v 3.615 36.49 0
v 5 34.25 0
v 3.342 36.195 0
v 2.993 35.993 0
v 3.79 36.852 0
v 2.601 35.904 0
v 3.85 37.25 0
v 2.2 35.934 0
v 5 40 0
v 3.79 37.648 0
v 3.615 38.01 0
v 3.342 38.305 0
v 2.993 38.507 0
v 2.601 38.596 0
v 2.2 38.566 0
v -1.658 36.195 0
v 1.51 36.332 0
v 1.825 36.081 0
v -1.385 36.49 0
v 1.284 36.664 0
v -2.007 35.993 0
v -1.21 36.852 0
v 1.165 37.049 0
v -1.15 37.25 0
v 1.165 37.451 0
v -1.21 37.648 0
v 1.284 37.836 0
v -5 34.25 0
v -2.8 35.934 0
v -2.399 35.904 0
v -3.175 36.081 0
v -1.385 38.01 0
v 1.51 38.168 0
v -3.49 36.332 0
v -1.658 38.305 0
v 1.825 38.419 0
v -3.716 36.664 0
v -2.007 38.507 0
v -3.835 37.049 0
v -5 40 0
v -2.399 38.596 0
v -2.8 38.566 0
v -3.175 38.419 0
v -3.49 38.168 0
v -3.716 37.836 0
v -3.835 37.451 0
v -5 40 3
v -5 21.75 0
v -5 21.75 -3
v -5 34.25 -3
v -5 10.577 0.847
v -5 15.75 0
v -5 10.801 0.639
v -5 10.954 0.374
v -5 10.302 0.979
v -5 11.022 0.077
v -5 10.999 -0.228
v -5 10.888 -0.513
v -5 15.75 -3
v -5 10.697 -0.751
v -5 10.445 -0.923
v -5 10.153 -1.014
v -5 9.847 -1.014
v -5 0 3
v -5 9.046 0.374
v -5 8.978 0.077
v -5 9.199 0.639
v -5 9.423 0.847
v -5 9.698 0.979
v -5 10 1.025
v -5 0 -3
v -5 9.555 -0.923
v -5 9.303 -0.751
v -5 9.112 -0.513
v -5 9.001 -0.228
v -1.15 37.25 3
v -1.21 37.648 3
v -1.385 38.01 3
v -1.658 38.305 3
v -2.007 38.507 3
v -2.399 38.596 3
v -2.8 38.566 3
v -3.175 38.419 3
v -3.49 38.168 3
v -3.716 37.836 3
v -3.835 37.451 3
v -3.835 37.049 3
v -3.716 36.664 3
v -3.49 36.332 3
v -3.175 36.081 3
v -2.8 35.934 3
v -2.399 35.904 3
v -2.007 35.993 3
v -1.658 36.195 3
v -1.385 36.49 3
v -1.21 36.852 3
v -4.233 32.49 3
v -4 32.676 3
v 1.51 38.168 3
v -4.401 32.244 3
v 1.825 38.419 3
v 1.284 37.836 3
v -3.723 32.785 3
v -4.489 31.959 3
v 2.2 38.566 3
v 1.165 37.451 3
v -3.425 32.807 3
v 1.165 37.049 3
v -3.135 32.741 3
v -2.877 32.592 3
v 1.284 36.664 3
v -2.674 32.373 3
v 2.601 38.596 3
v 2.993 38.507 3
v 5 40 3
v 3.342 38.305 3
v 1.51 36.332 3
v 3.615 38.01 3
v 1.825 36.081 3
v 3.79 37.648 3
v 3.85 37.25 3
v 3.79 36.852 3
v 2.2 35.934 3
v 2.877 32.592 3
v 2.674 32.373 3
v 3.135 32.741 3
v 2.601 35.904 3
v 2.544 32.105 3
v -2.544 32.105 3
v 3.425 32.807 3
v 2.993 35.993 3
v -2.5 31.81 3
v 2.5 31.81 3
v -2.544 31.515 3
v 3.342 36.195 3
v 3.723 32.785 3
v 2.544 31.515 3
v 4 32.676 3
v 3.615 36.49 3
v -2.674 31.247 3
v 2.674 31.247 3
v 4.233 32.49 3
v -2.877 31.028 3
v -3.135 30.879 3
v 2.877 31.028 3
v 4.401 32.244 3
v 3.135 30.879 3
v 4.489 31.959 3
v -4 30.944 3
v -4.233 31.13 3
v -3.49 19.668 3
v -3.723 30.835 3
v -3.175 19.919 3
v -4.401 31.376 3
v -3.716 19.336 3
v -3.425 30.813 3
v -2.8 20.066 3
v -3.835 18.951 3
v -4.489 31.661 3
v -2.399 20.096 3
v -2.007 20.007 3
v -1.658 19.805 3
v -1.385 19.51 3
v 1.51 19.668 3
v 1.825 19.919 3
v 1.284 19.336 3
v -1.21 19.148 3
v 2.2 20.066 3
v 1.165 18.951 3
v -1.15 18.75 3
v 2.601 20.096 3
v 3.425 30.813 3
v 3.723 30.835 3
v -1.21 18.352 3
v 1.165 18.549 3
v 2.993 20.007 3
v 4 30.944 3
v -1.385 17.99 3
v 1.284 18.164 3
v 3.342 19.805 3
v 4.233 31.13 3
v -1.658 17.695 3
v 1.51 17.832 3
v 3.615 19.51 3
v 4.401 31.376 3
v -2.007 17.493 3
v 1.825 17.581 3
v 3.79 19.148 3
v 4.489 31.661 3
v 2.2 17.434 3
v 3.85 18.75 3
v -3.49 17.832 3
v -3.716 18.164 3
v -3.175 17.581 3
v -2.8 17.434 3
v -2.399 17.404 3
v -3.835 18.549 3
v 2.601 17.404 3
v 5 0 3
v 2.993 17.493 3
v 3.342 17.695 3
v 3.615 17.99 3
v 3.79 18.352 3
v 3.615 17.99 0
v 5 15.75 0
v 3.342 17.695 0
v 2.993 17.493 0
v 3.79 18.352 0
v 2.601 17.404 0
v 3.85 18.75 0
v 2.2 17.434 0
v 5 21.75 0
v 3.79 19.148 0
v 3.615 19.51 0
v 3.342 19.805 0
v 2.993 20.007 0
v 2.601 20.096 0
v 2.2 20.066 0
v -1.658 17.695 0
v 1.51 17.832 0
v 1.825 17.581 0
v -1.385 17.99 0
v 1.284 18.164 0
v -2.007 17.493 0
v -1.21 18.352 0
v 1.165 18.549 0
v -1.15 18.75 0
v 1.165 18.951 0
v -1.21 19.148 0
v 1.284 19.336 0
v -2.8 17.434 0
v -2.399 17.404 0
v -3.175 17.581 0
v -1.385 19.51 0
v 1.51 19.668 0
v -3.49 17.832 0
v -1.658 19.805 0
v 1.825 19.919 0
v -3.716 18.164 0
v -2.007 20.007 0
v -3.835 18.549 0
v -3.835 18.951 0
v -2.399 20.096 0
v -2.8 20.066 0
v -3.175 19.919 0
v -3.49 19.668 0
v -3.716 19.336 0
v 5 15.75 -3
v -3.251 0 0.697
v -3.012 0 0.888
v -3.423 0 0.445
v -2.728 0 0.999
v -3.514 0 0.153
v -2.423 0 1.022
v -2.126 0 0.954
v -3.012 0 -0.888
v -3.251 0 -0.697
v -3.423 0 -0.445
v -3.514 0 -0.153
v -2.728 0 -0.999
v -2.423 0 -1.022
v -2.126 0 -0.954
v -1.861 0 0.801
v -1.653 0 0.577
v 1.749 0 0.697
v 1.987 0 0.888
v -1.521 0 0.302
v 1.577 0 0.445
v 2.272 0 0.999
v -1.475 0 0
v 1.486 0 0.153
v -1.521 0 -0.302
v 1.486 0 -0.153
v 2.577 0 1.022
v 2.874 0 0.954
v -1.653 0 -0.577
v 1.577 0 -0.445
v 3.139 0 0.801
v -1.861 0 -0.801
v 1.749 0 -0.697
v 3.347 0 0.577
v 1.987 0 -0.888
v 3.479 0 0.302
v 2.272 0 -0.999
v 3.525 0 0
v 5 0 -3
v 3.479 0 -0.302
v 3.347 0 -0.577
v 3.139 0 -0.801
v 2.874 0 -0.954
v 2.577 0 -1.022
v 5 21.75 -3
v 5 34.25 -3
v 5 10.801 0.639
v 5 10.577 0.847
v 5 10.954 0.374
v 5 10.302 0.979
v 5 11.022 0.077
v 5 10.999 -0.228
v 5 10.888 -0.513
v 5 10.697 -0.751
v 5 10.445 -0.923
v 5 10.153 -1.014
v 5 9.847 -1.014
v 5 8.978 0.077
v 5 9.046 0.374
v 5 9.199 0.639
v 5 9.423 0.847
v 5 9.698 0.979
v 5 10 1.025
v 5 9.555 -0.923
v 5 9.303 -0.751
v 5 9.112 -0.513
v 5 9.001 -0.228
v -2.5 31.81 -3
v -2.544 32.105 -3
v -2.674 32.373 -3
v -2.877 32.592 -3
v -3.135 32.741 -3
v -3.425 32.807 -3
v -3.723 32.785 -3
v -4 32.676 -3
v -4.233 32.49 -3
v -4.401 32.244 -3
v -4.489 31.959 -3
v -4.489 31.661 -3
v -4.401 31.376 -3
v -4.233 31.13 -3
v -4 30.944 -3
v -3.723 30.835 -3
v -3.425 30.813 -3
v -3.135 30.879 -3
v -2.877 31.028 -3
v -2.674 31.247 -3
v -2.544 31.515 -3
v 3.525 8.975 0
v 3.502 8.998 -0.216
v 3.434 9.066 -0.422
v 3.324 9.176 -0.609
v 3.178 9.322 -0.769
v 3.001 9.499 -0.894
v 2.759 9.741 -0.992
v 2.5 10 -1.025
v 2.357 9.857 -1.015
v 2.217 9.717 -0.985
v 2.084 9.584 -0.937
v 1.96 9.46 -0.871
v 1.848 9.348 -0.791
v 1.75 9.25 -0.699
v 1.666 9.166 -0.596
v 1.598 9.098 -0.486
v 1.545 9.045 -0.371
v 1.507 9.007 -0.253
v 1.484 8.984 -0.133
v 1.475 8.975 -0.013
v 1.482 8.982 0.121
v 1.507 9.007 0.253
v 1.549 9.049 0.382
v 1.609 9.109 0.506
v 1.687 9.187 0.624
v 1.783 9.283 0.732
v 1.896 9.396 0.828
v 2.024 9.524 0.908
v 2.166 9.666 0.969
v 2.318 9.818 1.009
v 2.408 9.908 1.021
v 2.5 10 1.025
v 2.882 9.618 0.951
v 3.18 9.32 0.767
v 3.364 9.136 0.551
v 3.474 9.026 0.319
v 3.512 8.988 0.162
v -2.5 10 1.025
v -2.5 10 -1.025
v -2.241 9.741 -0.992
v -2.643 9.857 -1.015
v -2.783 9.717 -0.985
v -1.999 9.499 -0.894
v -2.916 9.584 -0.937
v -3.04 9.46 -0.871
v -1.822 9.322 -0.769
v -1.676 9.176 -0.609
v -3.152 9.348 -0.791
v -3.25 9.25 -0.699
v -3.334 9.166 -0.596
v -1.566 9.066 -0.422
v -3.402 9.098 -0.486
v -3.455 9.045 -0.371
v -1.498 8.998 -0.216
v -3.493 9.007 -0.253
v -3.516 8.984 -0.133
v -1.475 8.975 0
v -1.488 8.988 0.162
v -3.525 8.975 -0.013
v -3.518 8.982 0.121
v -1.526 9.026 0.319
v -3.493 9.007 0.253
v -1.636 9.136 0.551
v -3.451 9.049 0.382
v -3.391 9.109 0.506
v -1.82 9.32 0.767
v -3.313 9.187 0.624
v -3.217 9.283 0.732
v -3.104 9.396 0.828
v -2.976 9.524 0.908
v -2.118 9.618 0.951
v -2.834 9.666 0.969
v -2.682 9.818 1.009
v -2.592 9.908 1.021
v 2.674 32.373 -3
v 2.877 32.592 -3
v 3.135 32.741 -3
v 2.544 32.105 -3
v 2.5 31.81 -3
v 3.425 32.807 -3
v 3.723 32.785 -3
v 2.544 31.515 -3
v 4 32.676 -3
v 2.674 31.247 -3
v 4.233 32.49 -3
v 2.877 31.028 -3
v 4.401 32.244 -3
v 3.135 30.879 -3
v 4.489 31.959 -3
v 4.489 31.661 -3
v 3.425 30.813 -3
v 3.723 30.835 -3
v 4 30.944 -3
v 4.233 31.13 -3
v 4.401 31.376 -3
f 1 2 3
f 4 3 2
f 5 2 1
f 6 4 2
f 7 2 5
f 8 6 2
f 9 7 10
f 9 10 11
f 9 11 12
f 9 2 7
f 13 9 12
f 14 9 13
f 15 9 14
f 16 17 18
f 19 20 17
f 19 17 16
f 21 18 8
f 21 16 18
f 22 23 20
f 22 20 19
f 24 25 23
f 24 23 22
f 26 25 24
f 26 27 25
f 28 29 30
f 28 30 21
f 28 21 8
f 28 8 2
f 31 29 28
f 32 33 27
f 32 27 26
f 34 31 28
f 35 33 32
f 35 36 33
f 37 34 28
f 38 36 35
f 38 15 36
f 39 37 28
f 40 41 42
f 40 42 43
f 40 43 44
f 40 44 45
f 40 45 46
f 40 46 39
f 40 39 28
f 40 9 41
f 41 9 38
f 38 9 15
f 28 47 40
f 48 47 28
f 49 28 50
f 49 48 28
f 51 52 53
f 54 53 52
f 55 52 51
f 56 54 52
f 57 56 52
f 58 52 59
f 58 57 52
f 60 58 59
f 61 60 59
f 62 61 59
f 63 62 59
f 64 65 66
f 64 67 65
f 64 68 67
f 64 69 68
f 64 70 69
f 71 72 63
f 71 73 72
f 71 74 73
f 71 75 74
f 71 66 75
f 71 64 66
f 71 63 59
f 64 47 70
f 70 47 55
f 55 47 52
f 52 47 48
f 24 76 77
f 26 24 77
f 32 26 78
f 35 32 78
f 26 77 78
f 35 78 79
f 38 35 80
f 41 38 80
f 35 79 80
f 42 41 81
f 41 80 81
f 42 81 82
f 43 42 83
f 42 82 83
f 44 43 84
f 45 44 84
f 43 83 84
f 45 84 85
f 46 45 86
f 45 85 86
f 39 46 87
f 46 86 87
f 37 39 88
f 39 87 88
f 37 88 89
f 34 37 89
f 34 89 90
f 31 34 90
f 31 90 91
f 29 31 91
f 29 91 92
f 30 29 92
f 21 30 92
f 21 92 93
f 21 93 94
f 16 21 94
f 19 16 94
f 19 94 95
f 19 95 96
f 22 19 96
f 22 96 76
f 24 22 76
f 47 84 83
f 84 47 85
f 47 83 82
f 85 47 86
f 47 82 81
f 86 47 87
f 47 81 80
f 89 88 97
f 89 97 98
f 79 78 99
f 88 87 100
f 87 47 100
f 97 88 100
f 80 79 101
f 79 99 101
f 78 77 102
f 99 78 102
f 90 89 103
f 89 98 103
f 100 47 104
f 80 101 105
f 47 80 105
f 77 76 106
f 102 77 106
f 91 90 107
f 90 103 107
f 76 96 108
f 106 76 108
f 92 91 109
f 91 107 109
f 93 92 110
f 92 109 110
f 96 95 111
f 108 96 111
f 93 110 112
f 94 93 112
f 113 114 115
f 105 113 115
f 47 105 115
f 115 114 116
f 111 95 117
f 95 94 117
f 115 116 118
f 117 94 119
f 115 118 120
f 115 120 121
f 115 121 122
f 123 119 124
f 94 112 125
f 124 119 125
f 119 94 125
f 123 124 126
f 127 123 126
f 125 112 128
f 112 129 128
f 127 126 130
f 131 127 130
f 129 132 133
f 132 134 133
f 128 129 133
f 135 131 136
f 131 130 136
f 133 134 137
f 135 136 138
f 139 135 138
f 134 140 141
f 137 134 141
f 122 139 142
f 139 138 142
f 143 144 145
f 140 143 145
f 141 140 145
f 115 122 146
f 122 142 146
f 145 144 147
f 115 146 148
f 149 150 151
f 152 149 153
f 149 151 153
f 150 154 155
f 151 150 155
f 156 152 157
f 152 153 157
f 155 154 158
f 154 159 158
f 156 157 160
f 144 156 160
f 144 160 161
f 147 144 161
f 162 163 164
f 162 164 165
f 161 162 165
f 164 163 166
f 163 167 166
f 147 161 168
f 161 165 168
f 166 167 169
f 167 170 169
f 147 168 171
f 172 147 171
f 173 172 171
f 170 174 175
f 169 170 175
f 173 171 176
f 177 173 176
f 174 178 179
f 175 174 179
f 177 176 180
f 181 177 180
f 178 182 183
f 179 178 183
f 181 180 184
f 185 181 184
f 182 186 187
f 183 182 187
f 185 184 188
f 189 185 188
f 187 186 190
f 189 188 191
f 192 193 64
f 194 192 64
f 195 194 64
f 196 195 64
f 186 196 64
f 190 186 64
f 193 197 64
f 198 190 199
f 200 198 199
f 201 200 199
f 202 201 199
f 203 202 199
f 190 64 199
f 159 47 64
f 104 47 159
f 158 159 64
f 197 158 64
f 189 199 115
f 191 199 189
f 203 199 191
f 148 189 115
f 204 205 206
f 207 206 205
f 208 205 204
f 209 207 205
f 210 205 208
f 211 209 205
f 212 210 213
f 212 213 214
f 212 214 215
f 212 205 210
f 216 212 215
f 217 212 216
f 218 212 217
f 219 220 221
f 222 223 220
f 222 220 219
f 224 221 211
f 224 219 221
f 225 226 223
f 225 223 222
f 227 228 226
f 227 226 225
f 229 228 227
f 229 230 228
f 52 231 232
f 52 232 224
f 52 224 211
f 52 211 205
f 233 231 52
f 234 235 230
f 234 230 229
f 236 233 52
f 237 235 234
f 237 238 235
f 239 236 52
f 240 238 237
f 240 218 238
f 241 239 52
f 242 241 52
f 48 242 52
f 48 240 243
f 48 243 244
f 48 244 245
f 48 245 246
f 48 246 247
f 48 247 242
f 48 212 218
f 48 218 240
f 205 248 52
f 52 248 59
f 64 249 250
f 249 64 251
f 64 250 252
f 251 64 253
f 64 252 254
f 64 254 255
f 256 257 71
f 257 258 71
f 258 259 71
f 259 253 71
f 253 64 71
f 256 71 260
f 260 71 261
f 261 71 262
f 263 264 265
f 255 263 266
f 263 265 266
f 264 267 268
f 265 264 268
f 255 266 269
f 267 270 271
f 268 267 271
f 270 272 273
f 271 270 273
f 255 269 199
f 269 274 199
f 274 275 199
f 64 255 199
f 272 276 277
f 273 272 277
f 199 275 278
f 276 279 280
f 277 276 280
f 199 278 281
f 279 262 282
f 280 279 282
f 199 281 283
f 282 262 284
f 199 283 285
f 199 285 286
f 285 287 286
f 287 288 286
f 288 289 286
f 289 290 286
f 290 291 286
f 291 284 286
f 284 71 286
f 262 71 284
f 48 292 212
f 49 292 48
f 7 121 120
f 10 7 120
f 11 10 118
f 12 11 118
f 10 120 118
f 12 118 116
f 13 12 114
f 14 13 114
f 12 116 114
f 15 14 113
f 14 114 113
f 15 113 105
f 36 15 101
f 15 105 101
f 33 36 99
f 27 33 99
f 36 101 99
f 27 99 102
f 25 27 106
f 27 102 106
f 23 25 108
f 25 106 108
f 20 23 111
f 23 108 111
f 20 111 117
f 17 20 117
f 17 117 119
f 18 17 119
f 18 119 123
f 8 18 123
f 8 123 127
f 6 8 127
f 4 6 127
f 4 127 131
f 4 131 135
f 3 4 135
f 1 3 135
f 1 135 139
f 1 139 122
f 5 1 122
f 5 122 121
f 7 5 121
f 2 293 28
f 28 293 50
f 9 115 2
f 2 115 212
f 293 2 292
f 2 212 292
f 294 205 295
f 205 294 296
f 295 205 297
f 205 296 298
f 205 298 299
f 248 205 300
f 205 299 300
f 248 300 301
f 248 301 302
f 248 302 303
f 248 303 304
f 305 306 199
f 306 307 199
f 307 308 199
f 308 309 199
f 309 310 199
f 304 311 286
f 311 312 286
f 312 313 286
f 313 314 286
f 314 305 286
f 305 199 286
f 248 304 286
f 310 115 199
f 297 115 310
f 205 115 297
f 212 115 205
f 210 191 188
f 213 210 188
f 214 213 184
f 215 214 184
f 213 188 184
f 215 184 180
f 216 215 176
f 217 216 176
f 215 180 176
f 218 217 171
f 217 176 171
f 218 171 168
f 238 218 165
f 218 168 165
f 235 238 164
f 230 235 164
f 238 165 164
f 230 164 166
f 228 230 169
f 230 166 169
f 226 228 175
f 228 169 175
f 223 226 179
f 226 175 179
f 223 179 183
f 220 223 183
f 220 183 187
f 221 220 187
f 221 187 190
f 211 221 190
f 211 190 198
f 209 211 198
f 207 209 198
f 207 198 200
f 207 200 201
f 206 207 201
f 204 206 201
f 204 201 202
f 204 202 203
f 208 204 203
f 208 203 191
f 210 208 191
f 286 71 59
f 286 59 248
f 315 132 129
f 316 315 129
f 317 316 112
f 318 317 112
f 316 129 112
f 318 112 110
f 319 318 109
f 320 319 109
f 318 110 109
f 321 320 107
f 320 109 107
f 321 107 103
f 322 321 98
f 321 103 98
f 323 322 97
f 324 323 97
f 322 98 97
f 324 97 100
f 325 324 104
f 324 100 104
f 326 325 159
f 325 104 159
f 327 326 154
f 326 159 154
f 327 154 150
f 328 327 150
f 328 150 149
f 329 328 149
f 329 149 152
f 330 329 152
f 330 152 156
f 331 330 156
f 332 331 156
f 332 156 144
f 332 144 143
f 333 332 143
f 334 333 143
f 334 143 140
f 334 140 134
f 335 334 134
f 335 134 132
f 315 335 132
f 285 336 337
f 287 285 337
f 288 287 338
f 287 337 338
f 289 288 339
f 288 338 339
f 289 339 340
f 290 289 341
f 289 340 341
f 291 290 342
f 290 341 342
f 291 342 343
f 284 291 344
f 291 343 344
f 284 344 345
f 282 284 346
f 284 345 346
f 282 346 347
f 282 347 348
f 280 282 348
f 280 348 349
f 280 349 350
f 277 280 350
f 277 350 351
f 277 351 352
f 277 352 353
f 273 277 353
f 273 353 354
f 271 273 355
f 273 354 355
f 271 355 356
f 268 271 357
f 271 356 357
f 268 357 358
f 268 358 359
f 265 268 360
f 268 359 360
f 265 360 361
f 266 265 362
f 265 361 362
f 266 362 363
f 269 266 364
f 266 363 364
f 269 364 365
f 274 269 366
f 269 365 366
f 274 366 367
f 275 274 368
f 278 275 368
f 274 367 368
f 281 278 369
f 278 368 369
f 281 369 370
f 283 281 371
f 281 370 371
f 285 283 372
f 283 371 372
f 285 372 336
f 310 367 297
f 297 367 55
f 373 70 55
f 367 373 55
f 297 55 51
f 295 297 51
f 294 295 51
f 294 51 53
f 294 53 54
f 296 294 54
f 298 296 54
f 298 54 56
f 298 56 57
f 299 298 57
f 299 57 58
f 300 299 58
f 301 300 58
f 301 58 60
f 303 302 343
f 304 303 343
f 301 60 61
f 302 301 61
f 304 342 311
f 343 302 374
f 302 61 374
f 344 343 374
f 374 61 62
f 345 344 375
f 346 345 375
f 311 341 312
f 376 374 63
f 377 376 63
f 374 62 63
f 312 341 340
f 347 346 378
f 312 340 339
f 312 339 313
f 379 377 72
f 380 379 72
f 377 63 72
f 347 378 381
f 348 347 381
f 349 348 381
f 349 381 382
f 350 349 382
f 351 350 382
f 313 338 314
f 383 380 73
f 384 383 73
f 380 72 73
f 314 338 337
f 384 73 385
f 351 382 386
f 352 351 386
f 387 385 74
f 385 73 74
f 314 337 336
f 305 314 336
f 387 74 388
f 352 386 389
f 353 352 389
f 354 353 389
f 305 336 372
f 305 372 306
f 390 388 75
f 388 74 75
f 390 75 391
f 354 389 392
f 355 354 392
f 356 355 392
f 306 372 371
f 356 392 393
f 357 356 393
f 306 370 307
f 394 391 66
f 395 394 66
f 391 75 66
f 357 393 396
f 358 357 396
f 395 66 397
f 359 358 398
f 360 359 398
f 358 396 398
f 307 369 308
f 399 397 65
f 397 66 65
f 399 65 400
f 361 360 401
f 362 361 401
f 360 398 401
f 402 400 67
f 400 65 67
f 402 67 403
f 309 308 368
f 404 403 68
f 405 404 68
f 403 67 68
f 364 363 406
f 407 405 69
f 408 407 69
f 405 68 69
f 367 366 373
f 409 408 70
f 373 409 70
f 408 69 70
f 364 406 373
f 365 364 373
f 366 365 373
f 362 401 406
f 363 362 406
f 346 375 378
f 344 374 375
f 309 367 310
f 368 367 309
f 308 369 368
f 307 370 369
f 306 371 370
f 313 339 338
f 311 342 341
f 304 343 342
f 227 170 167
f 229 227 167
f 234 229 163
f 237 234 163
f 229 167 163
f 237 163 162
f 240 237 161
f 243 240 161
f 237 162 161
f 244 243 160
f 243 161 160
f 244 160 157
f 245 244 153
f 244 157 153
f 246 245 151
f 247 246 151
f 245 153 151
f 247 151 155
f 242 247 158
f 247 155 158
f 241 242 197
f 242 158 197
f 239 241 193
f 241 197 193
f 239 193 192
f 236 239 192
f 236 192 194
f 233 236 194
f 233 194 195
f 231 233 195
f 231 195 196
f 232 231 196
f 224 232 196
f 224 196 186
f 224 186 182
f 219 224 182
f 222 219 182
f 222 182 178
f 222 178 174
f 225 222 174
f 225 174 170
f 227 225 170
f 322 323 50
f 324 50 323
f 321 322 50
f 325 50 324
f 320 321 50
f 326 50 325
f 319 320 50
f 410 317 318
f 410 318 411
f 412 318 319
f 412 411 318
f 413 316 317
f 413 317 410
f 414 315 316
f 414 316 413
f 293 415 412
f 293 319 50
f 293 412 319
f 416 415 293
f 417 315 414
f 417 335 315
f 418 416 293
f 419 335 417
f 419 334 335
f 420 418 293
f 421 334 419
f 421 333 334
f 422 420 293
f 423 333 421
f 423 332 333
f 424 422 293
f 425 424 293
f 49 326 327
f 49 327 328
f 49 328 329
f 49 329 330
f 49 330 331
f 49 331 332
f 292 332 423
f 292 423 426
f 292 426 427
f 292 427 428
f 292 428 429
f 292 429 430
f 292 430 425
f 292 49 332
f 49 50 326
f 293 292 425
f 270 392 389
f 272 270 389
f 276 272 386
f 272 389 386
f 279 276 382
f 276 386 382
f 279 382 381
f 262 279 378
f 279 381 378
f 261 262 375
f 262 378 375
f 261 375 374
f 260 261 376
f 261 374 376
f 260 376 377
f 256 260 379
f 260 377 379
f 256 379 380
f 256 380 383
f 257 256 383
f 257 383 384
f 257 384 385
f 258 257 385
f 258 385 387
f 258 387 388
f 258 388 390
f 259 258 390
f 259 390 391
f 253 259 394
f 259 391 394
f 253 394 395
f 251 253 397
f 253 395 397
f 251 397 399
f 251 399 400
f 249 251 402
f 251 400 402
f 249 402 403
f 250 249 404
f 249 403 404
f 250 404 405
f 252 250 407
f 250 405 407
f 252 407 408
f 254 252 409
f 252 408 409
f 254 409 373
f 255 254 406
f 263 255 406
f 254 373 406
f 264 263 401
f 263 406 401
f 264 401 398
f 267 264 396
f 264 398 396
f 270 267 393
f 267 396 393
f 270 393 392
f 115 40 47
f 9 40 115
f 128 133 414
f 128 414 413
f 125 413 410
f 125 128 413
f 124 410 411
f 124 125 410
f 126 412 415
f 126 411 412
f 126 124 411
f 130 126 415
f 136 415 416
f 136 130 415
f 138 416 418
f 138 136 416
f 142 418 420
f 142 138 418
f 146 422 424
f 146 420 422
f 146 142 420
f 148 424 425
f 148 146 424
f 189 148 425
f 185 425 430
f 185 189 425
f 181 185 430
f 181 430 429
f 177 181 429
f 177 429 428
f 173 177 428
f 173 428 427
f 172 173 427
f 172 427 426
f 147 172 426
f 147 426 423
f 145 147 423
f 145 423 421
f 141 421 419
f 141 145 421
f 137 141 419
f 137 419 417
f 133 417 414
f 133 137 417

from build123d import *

# Parameters (mm, degrees)
SKETCH1_W                = 10
SKETCH1_H                = 6
BOSS_EXTRUDE1_DEPTH      = 40
M2_5_TAPPED_HOLE1_D      = 2.05
M2_5_TAPPED_HOLE1_DEPTH  = 10
M2_5_TAPPED_HOLE1_TIP    = 0.615882135
M2_5_CLEARANCE_HOLE1_D   = 2.7
F_2_0_2_DIAMETER_HOLE2_D = 2
M2_5_TAPPED_HOLE2_D      = 2.05
SKETCH13_W               = 10
SKETCH13_H               = 6
SKETCH13_H_2             = 5.75
CUT_EXTRUDE2_DEPTH       = 3


with BuildPart() as part:
    # Sketch1 → Boss-Extrude1 (new body)
    with BuildSketch(Plane(origin=(0, 0, 0), x_dir=(1, 0, 0), z_dir=(0, 1, 0))):
        Rectangle(SKETCH1_W, SKETCH1_H)
    extrude(amount=BOSS_EXTRUDE1_DEPTH)

    # M2.5 Tapped Hole1
    with Locations(Plane(origin=(0, 0, 0), x_dir=(-1, 0, 0), z_dir=(0, -1, 0))):
        with Locations((2.5, 0), (-2.5, 0)):
            Hole(M2_5_TAPPED_HOLE1_D / 2, depth=M2_5_TAPPED_HOLE1_DEPTH)
            with Locations((0, 0, -(M2_5_TAPPED_HOLE1_DEPTH + M2_5_TAPPED_HOLE1_TIP / 2))):  # 118° drill point
                Cone(0, M2_5_TAPPED_HOLE1_D / 2, M2_5_TAPPED_HOLE1_TIP, mode=Mode.SUBTRACT)

    # M2.5 Clearance Hole1 (through all)
    with Locations(Plane(origin=(0, 0, -3), x_dir=(-1, 0, 0), z_dir=(0, 0, -1))):
        with Locations((-2.5, 37.25), (2.5, 37.25), (-2.5, 18.75), (2.5, 18.75)):
            Hole(M2_5_CLEARANCE_HOLE1_D / 2)

    # Ø2.0 (2) Diameter Hole2 (through all)
    with Locations(Plane(origin=(0, 0, -3), x_dir=(-1, 0, 0), z_dir=(0, 0, -1))):
        with Locations((3.5, 31.81)):
            f_2_0_2_diameter_hole2 = Hole(F_2_0_2_DIAMETER_HOLE2_D / 2)

    # Mirror1: Ø2.0 (2) Diameter Hole2 across plane
    add(f_2_0_2_diameter_hole2.mirror(Plane(origin=(0, 0, 0), x_dir=(0, 0, 1), z_dir=(1, 0, 0))), mode=Mode.SUBTRACT)

    # M2.5 Tapped Hole2 (through all)
    with Locations(Plane(origin=(5, 0, 0), x_dir=(0, 0, -1), z_dir=(1, 0, 0))):
        with Locations((0, 10)):
            Hole(M2_5_TAPPED_HOLE2_D / 2)

    # Sketch13 → Cut-Extrude2 (cut)
    with BuildSketch(Plane(origin=(0, 0, -3), x_dir=(-1, 0, 0), z_dir=(0, 0, -1))):
        with Locations((0, 18.75)):
            Rectangle(SKETCH13_W, SKETCH13_H)
        with Locations((0, 37.125)):
            Rectangle(SKETCH13_W, SKETCH13_H_2)
    extrude(amount=-CUT_EXTRUDE2_DEPTH, mode=Mode.SUBTRACT)


solid = part.part
